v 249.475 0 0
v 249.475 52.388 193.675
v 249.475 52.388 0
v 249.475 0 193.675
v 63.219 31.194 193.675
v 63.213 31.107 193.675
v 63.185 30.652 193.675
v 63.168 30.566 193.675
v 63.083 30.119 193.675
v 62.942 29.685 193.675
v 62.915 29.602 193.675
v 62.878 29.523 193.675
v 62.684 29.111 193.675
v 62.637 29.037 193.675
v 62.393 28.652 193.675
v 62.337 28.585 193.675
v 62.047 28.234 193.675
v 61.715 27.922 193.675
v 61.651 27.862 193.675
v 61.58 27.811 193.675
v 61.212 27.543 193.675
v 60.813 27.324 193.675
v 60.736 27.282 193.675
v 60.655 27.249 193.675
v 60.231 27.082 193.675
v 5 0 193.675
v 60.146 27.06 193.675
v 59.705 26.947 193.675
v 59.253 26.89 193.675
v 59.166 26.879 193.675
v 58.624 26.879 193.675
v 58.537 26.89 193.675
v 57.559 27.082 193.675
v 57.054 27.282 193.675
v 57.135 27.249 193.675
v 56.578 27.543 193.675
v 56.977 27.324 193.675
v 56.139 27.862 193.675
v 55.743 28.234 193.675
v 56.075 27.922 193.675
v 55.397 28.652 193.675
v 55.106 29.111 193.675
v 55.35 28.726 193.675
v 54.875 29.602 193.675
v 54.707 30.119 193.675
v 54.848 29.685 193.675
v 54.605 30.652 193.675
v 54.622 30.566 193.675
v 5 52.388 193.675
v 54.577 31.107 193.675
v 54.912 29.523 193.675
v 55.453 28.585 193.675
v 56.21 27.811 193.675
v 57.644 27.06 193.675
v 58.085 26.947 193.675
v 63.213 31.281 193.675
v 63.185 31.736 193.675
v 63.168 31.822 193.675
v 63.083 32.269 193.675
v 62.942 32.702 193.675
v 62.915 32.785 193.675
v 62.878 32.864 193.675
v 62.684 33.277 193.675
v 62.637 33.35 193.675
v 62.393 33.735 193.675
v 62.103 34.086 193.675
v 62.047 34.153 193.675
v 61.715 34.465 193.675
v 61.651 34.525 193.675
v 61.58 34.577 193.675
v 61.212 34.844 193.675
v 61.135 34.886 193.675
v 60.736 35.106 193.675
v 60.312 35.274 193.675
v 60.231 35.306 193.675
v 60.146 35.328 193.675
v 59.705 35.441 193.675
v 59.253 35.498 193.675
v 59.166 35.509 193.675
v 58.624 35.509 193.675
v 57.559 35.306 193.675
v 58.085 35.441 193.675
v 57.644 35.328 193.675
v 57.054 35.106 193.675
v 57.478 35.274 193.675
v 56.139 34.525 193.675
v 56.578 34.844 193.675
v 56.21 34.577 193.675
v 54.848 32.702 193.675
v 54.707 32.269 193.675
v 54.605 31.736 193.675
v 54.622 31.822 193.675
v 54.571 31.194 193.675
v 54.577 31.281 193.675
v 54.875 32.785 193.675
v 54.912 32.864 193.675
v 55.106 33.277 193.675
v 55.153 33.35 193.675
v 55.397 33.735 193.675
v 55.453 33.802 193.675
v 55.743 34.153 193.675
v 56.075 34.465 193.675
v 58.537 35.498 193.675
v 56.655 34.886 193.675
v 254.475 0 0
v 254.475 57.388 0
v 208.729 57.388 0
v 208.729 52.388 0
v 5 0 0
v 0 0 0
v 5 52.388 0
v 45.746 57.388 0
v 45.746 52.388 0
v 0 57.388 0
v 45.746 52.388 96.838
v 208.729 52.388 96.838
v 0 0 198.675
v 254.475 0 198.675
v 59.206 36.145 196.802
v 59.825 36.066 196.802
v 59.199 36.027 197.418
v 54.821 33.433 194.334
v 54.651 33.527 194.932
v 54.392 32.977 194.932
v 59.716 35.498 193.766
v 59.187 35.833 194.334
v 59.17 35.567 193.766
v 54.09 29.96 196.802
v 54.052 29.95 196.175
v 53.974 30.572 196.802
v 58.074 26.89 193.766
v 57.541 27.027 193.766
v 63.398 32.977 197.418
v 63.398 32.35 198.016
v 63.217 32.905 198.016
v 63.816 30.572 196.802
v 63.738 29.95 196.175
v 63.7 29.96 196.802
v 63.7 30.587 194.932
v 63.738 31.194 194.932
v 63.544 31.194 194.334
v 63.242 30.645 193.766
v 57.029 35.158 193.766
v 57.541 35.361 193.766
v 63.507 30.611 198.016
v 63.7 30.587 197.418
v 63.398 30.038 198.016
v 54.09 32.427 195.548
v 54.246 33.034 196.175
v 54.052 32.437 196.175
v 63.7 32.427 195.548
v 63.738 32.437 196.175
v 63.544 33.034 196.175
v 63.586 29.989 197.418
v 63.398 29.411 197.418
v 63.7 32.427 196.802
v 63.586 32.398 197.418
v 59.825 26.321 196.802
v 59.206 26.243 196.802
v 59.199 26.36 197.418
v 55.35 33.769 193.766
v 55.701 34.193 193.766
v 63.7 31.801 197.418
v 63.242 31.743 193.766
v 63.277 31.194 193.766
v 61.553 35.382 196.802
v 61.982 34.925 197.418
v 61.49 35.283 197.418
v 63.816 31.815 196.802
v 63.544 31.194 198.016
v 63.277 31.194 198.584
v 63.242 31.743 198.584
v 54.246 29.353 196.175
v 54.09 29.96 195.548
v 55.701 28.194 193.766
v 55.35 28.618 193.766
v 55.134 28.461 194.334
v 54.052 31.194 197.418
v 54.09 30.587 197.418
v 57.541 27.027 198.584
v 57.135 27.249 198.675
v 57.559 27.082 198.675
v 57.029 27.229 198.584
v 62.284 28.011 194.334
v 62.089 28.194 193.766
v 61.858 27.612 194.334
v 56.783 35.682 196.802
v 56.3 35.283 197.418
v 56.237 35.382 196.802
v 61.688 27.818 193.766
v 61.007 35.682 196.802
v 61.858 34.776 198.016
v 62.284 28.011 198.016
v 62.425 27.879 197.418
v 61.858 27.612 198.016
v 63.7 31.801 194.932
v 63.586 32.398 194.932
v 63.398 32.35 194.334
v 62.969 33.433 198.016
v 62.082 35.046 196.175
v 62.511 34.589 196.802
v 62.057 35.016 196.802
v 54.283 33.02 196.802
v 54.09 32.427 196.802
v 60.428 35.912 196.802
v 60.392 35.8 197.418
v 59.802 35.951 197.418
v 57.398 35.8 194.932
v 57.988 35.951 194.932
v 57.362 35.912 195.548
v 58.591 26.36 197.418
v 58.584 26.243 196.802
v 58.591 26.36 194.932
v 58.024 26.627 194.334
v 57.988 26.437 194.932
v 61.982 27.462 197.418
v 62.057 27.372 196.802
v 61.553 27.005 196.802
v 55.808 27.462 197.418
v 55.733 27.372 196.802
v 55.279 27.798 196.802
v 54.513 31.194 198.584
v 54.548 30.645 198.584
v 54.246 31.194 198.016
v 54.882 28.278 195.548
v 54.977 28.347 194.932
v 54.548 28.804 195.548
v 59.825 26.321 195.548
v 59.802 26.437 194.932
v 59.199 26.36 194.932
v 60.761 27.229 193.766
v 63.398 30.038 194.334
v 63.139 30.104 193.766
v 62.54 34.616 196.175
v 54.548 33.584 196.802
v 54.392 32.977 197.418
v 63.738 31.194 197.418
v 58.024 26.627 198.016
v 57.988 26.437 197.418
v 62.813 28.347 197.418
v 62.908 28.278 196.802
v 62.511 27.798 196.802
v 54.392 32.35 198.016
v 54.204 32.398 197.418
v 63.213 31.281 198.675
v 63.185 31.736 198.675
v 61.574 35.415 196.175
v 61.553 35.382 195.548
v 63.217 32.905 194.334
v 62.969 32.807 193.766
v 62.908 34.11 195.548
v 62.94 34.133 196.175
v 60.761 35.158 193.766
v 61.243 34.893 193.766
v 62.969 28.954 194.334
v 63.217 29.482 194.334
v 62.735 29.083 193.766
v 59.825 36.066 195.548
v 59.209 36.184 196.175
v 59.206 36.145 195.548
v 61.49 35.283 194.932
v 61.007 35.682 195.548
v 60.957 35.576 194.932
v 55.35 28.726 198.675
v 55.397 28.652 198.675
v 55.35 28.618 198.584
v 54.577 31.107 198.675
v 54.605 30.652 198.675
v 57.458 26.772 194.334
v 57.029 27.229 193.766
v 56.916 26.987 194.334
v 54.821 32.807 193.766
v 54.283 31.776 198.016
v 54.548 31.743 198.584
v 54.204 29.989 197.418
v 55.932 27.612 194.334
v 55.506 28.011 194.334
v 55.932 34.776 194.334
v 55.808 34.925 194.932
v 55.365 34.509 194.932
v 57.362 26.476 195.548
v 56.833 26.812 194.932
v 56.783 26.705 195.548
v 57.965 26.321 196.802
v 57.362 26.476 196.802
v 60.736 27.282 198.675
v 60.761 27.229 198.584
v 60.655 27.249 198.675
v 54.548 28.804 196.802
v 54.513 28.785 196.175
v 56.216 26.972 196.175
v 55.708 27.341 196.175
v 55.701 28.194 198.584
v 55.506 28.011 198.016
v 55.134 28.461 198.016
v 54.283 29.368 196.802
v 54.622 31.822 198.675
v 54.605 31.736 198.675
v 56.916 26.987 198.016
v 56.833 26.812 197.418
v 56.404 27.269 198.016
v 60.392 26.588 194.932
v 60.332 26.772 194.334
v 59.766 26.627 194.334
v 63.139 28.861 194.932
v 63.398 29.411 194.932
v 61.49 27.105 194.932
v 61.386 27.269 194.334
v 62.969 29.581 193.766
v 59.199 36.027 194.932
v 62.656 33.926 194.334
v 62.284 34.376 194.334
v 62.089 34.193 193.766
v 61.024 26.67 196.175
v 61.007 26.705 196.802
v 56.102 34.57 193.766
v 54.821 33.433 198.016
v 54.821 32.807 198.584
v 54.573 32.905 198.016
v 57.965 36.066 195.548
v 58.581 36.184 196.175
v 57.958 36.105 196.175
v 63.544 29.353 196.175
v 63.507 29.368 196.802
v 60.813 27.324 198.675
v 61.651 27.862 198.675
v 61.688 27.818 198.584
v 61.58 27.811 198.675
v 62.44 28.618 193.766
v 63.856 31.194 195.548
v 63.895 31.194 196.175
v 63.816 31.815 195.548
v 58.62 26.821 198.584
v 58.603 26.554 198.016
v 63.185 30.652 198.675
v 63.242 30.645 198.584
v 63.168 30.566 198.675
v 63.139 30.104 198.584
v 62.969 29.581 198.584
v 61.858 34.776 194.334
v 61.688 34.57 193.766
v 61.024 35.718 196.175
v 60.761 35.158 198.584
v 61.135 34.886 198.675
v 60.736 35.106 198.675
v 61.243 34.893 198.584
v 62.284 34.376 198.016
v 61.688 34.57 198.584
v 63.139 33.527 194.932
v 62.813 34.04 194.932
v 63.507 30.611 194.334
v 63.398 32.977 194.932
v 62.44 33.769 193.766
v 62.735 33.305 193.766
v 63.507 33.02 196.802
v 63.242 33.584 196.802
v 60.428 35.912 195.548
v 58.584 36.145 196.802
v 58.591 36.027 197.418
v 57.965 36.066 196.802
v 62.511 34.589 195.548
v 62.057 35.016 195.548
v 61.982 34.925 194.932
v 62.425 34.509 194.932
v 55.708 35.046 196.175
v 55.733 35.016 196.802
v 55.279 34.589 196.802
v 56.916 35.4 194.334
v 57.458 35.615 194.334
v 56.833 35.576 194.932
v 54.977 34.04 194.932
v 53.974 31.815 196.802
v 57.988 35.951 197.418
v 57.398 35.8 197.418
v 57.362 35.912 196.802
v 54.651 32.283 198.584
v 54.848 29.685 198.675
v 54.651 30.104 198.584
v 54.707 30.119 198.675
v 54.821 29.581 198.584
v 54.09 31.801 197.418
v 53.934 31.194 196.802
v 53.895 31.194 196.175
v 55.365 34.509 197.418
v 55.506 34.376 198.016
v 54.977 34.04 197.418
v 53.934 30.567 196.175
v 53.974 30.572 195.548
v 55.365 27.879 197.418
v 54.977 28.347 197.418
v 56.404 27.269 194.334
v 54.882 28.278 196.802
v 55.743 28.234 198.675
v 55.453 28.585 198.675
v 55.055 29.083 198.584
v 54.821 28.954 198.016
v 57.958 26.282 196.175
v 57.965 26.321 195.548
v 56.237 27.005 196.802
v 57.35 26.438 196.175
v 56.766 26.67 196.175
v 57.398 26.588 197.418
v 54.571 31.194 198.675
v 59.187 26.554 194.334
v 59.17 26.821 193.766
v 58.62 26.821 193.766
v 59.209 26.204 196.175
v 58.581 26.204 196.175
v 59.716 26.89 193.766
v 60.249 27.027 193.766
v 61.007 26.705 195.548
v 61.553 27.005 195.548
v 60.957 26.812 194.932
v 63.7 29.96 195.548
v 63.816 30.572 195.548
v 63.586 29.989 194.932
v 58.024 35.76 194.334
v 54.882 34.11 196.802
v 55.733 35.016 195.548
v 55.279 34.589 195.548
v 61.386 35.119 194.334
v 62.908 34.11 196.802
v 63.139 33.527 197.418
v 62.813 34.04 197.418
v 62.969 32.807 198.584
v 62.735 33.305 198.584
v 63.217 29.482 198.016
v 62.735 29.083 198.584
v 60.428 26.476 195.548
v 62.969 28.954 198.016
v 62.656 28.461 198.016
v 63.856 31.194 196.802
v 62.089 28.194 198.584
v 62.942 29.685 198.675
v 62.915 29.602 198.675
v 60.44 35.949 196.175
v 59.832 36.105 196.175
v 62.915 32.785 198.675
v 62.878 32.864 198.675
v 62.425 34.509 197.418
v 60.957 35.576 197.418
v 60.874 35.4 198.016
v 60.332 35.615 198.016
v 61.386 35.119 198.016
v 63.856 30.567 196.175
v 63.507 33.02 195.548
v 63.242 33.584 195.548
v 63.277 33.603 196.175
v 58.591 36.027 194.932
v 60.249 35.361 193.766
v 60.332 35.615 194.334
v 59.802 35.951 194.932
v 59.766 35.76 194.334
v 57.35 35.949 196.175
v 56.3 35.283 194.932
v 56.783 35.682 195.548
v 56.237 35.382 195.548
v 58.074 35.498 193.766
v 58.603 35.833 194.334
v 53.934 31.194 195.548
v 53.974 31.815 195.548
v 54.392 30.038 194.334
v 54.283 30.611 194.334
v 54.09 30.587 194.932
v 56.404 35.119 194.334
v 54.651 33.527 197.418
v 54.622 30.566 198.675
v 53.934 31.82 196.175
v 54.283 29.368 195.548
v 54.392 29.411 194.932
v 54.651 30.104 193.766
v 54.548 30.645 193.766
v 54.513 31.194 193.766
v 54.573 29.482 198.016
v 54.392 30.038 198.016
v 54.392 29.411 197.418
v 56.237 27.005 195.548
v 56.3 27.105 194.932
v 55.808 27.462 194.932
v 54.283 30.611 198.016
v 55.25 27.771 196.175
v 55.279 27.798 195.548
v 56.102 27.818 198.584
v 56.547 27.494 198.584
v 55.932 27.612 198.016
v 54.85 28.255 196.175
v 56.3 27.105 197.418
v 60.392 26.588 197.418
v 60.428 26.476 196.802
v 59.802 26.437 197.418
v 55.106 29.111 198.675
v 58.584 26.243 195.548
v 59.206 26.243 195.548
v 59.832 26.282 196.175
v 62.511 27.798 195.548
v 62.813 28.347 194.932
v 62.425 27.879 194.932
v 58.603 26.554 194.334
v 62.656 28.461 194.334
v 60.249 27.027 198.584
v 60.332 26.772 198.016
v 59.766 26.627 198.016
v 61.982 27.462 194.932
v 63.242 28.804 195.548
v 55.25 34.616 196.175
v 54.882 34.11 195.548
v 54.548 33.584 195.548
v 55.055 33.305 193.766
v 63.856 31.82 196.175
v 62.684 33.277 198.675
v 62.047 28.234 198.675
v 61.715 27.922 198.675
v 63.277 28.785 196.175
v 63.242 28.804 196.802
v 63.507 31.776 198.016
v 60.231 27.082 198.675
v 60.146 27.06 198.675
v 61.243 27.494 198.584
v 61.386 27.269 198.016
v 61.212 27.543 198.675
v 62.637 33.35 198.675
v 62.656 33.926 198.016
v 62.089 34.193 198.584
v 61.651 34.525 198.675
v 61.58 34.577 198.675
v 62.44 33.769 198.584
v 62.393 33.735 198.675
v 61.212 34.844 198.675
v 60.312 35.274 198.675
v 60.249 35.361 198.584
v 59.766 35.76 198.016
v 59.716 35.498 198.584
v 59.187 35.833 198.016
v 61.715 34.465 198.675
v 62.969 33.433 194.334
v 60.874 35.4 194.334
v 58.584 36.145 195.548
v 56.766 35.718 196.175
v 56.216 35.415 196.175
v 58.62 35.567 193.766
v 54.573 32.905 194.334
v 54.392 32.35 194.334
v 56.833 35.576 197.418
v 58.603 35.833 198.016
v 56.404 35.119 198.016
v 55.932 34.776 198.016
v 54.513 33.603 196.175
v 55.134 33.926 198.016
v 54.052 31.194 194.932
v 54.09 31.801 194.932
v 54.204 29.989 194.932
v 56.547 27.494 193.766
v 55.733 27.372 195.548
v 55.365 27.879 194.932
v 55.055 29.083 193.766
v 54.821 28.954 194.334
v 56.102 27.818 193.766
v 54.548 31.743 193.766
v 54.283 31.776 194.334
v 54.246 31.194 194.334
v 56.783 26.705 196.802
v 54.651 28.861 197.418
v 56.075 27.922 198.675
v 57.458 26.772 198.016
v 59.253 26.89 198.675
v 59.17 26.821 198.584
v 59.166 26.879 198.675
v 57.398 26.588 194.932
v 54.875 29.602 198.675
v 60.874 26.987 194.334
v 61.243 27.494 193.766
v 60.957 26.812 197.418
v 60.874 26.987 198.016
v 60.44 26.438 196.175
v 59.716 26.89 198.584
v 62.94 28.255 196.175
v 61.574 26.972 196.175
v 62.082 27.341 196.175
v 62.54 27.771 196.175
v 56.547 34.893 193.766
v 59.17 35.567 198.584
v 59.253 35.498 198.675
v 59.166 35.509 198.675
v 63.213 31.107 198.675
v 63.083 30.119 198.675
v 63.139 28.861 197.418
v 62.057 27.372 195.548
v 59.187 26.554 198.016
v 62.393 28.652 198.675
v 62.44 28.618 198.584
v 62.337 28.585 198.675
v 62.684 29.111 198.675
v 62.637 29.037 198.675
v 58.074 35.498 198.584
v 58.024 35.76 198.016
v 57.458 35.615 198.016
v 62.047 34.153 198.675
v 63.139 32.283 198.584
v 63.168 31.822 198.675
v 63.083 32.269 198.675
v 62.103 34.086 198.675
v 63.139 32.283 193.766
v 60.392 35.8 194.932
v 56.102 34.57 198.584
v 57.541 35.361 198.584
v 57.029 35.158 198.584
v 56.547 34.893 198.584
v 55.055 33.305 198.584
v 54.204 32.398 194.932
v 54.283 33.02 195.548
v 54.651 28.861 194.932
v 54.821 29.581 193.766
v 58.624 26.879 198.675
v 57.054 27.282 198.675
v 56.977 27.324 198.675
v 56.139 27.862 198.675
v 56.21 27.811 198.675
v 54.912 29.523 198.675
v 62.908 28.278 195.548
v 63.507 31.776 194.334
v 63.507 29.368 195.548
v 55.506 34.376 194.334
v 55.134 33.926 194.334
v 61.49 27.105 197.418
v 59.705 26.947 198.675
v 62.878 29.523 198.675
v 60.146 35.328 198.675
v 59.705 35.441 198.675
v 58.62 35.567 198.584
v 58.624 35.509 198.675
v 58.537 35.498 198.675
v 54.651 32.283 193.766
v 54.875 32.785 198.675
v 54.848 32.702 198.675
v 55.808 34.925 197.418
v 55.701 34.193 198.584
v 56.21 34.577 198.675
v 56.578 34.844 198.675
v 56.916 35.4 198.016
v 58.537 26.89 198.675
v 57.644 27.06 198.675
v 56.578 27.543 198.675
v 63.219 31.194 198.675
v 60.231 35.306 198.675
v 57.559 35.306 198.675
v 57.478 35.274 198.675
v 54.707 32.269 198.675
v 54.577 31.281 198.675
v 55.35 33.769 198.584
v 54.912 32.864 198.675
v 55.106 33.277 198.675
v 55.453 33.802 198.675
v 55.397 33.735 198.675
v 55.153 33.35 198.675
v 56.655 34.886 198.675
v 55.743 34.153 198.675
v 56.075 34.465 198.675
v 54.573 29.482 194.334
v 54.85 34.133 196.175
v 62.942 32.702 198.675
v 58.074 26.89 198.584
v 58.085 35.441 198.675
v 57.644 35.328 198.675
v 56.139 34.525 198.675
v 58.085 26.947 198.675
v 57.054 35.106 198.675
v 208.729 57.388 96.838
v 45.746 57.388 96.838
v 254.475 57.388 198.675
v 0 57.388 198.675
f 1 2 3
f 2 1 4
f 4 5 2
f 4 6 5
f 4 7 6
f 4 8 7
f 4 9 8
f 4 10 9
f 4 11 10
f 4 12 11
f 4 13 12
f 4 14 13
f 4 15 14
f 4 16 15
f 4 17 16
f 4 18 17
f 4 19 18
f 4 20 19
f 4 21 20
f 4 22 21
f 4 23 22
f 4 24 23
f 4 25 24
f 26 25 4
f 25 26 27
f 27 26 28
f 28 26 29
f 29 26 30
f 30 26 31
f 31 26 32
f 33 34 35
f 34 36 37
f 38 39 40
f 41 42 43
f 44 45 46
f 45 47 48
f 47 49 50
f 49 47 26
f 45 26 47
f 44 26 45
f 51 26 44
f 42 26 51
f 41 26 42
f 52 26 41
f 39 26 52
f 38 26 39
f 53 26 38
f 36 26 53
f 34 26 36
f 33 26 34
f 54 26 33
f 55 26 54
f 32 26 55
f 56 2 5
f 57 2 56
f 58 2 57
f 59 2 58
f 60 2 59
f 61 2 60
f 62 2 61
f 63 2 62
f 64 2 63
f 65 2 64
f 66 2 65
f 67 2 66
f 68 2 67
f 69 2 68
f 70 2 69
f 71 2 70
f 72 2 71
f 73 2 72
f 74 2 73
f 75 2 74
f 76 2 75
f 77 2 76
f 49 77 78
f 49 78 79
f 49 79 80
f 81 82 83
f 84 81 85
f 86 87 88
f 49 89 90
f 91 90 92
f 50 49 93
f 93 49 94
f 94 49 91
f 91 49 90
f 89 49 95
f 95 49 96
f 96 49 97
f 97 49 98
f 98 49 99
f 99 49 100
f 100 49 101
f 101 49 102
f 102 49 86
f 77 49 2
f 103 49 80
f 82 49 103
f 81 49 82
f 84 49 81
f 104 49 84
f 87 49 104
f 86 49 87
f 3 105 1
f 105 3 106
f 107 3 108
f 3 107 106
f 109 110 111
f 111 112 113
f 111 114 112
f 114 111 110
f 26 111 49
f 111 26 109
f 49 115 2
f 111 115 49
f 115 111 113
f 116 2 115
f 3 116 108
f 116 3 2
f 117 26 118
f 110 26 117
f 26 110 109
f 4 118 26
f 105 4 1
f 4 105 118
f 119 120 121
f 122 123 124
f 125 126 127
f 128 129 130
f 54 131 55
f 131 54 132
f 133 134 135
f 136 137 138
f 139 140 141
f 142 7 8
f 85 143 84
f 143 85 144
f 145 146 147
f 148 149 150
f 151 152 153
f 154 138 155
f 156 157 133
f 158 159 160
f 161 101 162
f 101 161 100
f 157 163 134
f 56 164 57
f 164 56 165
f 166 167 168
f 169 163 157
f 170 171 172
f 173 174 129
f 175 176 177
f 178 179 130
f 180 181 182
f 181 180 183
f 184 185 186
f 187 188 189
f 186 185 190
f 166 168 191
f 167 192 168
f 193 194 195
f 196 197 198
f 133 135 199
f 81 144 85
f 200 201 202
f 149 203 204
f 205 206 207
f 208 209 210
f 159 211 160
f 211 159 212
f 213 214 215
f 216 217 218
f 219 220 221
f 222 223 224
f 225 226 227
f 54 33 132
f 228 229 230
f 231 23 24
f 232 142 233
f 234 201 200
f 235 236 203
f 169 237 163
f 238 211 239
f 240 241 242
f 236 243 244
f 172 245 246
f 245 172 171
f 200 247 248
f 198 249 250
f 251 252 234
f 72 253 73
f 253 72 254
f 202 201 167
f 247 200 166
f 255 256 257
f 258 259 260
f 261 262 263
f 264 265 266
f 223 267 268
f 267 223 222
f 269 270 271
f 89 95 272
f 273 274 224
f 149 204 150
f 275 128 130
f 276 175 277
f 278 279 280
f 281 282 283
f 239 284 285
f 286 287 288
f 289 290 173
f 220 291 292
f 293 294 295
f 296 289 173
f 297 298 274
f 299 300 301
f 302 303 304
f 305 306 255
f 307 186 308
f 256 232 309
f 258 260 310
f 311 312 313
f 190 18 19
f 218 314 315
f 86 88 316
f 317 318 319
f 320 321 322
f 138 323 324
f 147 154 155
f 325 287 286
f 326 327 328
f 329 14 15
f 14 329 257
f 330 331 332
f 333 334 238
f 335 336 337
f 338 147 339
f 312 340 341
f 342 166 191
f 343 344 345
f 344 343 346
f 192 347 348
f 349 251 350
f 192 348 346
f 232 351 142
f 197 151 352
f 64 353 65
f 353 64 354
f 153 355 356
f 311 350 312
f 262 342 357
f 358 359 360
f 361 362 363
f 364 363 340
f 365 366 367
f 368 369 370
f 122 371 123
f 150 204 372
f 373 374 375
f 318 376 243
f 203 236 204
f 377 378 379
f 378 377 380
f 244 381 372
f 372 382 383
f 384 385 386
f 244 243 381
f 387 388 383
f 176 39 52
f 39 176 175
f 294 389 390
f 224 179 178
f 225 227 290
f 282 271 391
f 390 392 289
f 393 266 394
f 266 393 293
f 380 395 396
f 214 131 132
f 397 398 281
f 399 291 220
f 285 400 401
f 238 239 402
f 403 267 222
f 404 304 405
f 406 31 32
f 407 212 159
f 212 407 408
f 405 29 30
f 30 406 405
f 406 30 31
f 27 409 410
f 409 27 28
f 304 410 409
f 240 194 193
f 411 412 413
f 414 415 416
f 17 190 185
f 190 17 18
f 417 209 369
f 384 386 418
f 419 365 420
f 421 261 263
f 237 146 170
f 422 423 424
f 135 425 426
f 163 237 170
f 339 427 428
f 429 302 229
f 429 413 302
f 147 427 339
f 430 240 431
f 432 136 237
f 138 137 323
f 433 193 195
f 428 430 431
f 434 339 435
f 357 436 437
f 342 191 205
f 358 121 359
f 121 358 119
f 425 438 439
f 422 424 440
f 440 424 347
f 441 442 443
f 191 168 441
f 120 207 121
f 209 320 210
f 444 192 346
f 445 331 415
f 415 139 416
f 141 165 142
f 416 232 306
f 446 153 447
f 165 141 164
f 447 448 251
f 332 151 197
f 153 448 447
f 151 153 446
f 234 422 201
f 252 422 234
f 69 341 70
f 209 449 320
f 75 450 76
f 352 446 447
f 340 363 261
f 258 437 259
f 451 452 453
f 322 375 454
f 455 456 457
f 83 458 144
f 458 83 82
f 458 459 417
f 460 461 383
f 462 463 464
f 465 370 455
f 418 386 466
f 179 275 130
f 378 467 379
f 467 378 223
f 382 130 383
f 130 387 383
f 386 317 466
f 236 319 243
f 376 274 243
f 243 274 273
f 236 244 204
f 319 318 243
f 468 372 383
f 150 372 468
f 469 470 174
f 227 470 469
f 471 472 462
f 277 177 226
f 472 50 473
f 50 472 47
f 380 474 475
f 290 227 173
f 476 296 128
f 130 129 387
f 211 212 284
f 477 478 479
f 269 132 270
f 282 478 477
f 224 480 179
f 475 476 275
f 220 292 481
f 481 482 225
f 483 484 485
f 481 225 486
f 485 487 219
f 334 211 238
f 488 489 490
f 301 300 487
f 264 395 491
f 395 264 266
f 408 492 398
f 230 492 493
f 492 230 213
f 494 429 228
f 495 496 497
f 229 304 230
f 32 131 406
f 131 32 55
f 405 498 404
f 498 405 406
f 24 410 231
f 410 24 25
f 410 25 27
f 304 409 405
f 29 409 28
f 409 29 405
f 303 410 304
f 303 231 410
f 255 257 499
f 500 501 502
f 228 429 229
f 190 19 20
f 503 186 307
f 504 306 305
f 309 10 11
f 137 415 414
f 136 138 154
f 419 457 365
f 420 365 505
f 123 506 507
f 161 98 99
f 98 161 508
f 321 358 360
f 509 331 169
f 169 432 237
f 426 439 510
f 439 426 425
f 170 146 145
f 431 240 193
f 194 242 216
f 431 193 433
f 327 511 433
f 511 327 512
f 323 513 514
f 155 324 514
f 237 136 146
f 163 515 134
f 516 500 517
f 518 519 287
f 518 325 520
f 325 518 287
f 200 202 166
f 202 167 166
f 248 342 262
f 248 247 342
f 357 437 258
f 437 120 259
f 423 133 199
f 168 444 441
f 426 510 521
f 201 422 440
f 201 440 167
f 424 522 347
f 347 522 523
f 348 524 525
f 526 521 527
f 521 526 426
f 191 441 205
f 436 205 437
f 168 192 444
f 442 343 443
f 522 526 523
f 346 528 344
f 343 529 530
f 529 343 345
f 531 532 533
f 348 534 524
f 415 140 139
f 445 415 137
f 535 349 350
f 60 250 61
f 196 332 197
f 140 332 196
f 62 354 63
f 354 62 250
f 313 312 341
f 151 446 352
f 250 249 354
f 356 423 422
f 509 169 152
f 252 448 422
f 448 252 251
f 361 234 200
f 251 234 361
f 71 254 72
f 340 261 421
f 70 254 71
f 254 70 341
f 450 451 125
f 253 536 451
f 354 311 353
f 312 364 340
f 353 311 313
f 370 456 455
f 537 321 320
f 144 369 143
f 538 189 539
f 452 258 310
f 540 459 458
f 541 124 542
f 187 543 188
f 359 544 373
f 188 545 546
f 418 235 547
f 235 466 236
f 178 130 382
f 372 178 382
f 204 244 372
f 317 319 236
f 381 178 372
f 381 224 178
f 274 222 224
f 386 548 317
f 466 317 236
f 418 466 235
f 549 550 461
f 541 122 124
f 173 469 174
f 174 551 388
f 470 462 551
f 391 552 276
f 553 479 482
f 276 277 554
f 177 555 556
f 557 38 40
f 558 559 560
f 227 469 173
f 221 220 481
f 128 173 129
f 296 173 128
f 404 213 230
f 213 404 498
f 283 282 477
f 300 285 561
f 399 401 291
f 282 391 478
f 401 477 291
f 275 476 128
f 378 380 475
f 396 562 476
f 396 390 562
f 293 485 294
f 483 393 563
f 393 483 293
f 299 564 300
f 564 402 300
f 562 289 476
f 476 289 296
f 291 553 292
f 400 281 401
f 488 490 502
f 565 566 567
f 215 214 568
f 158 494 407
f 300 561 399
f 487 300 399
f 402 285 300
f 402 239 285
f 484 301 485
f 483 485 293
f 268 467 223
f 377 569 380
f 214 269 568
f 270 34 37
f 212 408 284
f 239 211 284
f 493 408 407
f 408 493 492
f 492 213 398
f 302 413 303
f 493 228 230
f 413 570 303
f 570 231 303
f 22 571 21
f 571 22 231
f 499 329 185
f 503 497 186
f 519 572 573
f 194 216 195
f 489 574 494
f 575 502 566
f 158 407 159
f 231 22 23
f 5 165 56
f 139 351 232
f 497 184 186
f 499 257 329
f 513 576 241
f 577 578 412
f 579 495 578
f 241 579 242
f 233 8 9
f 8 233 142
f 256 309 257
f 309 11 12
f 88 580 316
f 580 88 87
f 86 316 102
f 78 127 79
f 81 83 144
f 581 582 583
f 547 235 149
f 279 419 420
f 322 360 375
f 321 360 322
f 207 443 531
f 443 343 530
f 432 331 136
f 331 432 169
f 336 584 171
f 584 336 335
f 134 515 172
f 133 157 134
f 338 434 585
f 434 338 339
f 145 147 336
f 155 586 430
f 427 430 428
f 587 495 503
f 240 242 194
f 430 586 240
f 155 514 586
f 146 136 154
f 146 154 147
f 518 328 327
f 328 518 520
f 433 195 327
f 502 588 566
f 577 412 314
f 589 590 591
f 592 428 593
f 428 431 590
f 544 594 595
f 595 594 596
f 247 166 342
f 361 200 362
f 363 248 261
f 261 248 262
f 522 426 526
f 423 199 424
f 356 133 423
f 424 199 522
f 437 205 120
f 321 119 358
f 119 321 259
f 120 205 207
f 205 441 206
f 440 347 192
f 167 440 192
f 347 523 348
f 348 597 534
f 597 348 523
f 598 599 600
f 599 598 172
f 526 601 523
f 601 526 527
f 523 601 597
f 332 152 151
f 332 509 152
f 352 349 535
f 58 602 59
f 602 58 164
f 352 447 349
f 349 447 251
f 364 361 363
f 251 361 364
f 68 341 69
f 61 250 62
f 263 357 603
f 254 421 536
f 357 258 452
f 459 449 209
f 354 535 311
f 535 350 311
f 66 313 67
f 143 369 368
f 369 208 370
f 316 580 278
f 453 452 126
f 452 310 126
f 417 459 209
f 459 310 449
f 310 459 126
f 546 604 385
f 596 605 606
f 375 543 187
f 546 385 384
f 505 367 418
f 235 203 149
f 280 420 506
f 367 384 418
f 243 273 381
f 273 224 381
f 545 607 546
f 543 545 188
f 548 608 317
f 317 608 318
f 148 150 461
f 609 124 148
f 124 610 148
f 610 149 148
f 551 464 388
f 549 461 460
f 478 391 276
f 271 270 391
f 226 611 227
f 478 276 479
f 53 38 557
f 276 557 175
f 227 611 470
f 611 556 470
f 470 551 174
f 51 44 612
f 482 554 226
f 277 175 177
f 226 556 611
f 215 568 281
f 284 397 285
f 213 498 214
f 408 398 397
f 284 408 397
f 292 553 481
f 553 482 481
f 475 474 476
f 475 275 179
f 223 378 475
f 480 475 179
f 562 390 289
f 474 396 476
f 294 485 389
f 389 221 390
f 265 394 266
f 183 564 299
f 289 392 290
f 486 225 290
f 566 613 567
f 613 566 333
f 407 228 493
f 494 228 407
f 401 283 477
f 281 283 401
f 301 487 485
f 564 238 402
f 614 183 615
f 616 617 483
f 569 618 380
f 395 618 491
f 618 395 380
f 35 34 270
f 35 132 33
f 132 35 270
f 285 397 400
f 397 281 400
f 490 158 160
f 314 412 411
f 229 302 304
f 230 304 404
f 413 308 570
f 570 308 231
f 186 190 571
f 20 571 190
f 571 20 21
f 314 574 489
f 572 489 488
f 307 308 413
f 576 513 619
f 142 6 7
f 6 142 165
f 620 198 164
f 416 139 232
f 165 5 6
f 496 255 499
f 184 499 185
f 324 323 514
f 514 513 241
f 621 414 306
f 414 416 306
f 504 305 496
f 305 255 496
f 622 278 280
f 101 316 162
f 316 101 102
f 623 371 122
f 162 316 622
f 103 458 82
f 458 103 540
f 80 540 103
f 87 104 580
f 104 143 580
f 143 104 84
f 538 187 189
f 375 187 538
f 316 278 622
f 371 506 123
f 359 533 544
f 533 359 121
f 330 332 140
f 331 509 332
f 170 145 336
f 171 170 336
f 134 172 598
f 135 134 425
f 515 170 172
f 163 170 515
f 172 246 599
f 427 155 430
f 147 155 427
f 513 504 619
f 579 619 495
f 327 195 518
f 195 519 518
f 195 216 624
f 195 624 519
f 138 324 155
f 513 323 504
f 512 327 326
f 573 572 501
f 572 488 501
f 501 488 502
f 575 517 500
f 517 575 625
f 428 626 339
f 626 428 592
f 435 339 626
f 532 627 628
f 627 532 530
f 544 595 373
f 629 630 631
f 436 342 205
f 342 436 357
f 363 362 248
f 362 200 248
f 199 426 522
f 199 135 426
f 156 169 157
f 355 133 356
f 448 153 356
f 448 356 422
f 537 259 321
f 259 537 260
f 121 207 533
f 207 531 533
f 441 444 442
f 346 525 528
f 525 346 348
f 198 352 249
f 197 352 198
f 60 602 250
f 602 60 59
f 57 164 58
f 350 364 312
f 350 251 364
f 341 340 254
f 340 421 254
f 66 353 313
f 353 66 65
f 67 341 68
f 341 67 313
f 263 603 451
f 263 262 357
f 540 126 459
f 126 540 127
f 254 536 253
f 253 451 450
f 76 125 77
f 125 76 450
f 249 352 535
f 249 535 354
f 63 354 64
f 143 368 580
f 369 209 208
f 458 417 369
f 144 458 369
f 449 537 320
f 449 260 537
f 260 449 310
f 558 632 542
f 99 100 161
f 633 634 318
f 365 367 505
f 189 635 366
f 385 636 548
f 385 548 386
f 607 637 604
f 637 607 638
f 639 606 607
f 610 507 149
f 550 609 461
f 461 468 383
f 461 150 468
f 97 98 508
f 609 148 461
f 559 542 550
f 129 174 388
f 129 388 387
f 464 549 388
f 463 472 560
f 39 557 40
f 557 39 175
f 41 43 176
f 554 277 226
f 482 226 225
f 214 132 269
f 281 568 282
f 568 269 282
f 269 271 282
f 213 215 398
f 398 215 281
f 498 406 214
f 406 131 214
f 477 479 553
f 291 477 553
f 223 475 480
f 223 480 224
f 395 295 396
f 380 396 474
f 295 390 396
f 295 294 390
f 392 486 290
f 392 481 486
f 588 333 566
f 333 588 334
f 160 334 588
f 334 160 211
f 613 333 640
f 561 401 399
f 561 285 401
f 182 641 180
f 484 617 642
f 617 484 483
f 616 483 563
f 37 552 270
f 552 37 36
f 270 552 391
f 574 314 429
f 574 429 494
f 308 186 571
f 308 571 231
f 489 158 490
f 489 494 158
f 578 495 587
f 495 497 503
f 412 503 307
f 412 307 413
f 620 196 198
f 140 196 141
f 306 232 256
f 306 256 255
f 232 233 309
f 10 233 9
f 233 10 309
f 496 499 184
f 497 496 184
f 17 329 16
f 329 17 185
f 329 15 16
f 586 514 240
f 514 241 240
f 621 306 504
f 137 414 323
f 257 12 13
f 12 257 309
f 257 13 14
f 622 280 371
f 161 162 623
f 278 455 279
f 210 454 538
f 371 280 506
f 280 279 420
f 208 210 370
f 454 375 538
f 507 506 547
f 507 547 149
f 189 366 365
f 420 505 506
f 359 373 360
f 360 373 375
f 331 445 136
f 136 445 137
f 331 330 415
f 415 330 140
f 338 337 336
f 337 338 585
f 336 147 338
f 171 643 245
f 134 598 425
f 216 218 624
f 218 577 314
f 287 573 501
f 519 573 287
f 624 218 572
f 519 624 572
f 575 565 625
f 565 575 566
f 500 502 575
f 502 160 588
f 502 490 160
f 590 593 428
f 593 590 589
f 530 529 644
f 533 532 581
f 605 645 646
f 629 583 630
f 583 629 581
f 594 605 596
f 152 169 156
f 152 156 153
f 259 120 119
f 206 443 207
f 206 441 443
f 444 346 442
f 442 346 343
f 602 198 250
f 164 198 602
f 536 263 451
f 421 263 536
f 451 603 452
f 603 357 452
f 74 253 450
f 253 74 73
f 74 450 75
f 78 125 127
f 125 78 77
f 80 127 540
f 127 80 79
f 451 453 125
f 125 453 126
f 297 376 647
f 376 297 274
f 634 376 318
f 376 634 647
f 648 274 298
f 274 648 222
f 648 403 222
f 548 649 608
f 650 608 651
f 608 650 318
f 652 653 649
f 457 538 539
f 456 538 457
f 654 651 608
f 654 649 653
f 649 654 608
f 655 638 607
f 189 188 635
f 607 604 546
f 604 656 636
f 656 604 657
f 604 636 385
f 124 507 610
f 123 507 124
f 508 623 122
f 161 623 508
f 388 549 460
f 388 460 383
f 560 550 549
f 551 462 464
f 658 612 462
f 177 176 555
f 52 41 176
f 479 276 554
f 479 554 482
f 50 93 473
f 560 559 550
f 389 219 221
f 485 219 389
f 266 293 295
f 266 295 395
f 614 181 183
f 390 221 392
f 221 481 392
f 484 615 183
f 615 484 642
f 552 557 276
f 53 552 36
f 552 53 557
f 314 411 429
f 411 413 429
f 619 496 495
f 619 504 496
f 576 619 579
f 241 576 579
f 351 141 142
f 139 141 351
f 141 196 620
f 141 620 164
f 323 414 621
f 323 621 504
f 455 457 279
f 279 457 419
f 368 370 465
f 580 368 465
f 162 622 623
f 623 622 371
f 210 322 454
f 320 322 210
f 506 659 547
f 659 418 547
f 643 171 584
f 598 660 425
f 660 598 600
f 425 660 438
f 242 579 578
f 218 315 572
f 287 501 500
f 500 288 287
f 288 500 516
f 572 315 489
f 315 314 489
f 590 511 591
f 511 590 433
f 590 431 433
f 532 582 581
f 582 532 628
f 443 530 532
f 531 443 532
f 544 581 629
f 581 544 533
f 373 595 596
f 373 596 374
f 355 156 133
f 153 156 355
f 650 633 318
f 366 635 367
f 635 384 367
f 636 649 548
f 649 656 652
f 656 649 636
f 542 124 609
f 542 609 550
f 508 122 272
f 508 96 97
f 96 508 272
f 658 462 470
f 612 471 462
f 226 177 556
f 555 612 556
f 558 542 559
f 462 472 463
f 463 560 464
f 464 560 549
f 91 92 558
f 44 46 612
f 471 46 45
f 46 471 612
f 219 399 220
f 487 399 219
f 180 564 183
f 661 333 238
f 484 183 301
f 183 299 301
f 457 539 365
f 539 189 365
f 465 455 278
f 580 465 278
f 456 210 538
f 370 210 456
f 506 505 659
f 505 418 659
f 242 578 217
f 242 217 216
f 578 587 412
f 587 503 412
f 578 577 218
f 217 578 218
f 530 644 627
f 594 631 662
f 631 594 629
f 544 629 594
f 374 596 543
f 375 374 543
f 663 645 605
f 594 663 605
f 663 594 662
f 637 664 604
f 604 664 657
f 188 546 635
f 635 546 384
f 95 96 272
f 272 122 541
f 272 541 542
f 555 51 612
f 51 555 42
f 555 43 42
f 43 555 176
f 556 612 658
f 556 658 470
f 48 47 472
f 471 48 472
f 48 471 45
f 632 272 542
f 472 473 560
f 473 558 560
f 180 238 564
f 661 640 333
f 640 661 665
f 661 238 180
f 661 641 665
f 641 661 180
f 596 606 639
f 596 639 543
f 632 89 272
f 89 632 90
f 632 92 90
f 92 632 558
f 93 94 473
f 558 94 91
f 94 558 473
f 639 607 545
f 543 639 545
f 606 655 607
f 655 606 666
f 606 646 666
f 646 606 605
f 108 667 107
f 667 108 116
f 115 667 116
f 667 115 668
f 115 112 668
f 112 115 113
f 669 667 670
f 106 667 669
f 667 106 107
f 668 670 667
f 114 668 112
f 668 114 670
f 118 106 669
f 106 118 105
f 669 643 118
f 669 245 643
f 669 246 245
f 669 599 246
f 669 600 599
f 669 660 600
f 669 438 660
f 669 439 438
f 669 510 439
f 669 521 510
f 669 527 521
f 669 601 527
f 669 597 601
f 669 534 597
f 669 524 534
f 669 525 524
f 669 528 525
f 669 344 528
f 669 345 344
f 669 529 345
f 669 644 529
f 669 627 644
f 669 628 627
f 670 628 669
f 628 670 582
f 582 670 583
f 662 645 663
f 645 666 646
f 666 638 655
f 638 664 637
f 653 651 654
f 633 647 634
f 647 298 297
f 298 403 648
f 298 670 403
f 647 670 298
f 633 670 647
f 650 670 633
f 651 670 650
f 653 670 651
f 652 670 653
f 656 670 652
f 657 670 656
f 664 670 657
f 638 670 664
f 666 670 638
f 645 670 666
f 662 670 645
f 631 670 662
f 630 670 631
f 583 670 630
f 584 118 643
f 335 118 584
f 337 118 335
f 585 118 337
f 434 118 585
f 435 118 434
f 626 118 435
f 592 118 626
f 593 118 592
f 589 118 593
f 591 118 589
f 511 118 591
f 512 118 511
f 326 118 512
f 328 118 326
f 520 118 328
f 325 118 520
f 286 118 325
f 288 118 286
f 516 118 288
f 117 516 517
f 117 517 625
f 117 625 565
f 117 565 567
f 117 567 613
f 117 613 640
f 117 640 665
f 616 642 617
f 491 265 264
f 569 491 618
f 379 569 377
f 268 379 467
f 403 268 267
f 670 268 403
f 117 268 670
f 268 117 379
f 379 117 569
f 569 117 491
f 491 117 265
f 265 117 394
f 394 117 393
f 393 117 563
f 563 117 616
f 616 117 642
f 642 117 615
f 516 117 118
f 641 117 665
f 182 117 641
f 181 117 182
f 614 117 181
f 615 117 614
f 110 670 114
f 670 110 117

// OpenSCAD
z = 193.675;
y = 52.3875;
x = 244.475;

xex = 10;
yex = 5;
zex = 5;

$fn=50;

difference(){
	cube([x + xex, y + yex, z + zex]);
	union(){
		translate([xex / 2, 0, 0]){
			cube([x, y, z]);
		}
		translate([xex + x / 5, yex + y / 2, z + zex / 2]){
			sphere(zex);
		}
		cutw = 2 * x / 3;
		translate([(x + xex) / 2 - cutw / 2, y, 0]){
			cube([cutw, yex, z / 2]);
		}
	}
}
